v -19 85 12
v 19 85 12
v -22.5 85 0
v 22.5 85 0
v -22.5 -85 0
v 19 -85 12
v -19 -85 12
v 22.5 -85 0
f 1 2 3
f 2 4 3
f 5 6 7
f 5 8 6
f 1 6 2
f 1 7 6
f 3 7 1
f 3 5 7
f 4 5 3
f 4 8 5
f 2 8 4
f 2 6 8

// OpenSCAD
dovetail_bar(100);
//鸠尾板
module dovetail_bar(main_tube_lenght){

    rotate([90,0,0])
    translate([-22.5,0,-(main_tube_lenght+70)/2])
    //鸠尾板
color("DarkOrange")
linear_extrude(height=main_tube_lenght+70){

 
 polygon(points=[[0,0],[45,0],[41.5,12],[3.5,12]]);
 
 
    }
}
